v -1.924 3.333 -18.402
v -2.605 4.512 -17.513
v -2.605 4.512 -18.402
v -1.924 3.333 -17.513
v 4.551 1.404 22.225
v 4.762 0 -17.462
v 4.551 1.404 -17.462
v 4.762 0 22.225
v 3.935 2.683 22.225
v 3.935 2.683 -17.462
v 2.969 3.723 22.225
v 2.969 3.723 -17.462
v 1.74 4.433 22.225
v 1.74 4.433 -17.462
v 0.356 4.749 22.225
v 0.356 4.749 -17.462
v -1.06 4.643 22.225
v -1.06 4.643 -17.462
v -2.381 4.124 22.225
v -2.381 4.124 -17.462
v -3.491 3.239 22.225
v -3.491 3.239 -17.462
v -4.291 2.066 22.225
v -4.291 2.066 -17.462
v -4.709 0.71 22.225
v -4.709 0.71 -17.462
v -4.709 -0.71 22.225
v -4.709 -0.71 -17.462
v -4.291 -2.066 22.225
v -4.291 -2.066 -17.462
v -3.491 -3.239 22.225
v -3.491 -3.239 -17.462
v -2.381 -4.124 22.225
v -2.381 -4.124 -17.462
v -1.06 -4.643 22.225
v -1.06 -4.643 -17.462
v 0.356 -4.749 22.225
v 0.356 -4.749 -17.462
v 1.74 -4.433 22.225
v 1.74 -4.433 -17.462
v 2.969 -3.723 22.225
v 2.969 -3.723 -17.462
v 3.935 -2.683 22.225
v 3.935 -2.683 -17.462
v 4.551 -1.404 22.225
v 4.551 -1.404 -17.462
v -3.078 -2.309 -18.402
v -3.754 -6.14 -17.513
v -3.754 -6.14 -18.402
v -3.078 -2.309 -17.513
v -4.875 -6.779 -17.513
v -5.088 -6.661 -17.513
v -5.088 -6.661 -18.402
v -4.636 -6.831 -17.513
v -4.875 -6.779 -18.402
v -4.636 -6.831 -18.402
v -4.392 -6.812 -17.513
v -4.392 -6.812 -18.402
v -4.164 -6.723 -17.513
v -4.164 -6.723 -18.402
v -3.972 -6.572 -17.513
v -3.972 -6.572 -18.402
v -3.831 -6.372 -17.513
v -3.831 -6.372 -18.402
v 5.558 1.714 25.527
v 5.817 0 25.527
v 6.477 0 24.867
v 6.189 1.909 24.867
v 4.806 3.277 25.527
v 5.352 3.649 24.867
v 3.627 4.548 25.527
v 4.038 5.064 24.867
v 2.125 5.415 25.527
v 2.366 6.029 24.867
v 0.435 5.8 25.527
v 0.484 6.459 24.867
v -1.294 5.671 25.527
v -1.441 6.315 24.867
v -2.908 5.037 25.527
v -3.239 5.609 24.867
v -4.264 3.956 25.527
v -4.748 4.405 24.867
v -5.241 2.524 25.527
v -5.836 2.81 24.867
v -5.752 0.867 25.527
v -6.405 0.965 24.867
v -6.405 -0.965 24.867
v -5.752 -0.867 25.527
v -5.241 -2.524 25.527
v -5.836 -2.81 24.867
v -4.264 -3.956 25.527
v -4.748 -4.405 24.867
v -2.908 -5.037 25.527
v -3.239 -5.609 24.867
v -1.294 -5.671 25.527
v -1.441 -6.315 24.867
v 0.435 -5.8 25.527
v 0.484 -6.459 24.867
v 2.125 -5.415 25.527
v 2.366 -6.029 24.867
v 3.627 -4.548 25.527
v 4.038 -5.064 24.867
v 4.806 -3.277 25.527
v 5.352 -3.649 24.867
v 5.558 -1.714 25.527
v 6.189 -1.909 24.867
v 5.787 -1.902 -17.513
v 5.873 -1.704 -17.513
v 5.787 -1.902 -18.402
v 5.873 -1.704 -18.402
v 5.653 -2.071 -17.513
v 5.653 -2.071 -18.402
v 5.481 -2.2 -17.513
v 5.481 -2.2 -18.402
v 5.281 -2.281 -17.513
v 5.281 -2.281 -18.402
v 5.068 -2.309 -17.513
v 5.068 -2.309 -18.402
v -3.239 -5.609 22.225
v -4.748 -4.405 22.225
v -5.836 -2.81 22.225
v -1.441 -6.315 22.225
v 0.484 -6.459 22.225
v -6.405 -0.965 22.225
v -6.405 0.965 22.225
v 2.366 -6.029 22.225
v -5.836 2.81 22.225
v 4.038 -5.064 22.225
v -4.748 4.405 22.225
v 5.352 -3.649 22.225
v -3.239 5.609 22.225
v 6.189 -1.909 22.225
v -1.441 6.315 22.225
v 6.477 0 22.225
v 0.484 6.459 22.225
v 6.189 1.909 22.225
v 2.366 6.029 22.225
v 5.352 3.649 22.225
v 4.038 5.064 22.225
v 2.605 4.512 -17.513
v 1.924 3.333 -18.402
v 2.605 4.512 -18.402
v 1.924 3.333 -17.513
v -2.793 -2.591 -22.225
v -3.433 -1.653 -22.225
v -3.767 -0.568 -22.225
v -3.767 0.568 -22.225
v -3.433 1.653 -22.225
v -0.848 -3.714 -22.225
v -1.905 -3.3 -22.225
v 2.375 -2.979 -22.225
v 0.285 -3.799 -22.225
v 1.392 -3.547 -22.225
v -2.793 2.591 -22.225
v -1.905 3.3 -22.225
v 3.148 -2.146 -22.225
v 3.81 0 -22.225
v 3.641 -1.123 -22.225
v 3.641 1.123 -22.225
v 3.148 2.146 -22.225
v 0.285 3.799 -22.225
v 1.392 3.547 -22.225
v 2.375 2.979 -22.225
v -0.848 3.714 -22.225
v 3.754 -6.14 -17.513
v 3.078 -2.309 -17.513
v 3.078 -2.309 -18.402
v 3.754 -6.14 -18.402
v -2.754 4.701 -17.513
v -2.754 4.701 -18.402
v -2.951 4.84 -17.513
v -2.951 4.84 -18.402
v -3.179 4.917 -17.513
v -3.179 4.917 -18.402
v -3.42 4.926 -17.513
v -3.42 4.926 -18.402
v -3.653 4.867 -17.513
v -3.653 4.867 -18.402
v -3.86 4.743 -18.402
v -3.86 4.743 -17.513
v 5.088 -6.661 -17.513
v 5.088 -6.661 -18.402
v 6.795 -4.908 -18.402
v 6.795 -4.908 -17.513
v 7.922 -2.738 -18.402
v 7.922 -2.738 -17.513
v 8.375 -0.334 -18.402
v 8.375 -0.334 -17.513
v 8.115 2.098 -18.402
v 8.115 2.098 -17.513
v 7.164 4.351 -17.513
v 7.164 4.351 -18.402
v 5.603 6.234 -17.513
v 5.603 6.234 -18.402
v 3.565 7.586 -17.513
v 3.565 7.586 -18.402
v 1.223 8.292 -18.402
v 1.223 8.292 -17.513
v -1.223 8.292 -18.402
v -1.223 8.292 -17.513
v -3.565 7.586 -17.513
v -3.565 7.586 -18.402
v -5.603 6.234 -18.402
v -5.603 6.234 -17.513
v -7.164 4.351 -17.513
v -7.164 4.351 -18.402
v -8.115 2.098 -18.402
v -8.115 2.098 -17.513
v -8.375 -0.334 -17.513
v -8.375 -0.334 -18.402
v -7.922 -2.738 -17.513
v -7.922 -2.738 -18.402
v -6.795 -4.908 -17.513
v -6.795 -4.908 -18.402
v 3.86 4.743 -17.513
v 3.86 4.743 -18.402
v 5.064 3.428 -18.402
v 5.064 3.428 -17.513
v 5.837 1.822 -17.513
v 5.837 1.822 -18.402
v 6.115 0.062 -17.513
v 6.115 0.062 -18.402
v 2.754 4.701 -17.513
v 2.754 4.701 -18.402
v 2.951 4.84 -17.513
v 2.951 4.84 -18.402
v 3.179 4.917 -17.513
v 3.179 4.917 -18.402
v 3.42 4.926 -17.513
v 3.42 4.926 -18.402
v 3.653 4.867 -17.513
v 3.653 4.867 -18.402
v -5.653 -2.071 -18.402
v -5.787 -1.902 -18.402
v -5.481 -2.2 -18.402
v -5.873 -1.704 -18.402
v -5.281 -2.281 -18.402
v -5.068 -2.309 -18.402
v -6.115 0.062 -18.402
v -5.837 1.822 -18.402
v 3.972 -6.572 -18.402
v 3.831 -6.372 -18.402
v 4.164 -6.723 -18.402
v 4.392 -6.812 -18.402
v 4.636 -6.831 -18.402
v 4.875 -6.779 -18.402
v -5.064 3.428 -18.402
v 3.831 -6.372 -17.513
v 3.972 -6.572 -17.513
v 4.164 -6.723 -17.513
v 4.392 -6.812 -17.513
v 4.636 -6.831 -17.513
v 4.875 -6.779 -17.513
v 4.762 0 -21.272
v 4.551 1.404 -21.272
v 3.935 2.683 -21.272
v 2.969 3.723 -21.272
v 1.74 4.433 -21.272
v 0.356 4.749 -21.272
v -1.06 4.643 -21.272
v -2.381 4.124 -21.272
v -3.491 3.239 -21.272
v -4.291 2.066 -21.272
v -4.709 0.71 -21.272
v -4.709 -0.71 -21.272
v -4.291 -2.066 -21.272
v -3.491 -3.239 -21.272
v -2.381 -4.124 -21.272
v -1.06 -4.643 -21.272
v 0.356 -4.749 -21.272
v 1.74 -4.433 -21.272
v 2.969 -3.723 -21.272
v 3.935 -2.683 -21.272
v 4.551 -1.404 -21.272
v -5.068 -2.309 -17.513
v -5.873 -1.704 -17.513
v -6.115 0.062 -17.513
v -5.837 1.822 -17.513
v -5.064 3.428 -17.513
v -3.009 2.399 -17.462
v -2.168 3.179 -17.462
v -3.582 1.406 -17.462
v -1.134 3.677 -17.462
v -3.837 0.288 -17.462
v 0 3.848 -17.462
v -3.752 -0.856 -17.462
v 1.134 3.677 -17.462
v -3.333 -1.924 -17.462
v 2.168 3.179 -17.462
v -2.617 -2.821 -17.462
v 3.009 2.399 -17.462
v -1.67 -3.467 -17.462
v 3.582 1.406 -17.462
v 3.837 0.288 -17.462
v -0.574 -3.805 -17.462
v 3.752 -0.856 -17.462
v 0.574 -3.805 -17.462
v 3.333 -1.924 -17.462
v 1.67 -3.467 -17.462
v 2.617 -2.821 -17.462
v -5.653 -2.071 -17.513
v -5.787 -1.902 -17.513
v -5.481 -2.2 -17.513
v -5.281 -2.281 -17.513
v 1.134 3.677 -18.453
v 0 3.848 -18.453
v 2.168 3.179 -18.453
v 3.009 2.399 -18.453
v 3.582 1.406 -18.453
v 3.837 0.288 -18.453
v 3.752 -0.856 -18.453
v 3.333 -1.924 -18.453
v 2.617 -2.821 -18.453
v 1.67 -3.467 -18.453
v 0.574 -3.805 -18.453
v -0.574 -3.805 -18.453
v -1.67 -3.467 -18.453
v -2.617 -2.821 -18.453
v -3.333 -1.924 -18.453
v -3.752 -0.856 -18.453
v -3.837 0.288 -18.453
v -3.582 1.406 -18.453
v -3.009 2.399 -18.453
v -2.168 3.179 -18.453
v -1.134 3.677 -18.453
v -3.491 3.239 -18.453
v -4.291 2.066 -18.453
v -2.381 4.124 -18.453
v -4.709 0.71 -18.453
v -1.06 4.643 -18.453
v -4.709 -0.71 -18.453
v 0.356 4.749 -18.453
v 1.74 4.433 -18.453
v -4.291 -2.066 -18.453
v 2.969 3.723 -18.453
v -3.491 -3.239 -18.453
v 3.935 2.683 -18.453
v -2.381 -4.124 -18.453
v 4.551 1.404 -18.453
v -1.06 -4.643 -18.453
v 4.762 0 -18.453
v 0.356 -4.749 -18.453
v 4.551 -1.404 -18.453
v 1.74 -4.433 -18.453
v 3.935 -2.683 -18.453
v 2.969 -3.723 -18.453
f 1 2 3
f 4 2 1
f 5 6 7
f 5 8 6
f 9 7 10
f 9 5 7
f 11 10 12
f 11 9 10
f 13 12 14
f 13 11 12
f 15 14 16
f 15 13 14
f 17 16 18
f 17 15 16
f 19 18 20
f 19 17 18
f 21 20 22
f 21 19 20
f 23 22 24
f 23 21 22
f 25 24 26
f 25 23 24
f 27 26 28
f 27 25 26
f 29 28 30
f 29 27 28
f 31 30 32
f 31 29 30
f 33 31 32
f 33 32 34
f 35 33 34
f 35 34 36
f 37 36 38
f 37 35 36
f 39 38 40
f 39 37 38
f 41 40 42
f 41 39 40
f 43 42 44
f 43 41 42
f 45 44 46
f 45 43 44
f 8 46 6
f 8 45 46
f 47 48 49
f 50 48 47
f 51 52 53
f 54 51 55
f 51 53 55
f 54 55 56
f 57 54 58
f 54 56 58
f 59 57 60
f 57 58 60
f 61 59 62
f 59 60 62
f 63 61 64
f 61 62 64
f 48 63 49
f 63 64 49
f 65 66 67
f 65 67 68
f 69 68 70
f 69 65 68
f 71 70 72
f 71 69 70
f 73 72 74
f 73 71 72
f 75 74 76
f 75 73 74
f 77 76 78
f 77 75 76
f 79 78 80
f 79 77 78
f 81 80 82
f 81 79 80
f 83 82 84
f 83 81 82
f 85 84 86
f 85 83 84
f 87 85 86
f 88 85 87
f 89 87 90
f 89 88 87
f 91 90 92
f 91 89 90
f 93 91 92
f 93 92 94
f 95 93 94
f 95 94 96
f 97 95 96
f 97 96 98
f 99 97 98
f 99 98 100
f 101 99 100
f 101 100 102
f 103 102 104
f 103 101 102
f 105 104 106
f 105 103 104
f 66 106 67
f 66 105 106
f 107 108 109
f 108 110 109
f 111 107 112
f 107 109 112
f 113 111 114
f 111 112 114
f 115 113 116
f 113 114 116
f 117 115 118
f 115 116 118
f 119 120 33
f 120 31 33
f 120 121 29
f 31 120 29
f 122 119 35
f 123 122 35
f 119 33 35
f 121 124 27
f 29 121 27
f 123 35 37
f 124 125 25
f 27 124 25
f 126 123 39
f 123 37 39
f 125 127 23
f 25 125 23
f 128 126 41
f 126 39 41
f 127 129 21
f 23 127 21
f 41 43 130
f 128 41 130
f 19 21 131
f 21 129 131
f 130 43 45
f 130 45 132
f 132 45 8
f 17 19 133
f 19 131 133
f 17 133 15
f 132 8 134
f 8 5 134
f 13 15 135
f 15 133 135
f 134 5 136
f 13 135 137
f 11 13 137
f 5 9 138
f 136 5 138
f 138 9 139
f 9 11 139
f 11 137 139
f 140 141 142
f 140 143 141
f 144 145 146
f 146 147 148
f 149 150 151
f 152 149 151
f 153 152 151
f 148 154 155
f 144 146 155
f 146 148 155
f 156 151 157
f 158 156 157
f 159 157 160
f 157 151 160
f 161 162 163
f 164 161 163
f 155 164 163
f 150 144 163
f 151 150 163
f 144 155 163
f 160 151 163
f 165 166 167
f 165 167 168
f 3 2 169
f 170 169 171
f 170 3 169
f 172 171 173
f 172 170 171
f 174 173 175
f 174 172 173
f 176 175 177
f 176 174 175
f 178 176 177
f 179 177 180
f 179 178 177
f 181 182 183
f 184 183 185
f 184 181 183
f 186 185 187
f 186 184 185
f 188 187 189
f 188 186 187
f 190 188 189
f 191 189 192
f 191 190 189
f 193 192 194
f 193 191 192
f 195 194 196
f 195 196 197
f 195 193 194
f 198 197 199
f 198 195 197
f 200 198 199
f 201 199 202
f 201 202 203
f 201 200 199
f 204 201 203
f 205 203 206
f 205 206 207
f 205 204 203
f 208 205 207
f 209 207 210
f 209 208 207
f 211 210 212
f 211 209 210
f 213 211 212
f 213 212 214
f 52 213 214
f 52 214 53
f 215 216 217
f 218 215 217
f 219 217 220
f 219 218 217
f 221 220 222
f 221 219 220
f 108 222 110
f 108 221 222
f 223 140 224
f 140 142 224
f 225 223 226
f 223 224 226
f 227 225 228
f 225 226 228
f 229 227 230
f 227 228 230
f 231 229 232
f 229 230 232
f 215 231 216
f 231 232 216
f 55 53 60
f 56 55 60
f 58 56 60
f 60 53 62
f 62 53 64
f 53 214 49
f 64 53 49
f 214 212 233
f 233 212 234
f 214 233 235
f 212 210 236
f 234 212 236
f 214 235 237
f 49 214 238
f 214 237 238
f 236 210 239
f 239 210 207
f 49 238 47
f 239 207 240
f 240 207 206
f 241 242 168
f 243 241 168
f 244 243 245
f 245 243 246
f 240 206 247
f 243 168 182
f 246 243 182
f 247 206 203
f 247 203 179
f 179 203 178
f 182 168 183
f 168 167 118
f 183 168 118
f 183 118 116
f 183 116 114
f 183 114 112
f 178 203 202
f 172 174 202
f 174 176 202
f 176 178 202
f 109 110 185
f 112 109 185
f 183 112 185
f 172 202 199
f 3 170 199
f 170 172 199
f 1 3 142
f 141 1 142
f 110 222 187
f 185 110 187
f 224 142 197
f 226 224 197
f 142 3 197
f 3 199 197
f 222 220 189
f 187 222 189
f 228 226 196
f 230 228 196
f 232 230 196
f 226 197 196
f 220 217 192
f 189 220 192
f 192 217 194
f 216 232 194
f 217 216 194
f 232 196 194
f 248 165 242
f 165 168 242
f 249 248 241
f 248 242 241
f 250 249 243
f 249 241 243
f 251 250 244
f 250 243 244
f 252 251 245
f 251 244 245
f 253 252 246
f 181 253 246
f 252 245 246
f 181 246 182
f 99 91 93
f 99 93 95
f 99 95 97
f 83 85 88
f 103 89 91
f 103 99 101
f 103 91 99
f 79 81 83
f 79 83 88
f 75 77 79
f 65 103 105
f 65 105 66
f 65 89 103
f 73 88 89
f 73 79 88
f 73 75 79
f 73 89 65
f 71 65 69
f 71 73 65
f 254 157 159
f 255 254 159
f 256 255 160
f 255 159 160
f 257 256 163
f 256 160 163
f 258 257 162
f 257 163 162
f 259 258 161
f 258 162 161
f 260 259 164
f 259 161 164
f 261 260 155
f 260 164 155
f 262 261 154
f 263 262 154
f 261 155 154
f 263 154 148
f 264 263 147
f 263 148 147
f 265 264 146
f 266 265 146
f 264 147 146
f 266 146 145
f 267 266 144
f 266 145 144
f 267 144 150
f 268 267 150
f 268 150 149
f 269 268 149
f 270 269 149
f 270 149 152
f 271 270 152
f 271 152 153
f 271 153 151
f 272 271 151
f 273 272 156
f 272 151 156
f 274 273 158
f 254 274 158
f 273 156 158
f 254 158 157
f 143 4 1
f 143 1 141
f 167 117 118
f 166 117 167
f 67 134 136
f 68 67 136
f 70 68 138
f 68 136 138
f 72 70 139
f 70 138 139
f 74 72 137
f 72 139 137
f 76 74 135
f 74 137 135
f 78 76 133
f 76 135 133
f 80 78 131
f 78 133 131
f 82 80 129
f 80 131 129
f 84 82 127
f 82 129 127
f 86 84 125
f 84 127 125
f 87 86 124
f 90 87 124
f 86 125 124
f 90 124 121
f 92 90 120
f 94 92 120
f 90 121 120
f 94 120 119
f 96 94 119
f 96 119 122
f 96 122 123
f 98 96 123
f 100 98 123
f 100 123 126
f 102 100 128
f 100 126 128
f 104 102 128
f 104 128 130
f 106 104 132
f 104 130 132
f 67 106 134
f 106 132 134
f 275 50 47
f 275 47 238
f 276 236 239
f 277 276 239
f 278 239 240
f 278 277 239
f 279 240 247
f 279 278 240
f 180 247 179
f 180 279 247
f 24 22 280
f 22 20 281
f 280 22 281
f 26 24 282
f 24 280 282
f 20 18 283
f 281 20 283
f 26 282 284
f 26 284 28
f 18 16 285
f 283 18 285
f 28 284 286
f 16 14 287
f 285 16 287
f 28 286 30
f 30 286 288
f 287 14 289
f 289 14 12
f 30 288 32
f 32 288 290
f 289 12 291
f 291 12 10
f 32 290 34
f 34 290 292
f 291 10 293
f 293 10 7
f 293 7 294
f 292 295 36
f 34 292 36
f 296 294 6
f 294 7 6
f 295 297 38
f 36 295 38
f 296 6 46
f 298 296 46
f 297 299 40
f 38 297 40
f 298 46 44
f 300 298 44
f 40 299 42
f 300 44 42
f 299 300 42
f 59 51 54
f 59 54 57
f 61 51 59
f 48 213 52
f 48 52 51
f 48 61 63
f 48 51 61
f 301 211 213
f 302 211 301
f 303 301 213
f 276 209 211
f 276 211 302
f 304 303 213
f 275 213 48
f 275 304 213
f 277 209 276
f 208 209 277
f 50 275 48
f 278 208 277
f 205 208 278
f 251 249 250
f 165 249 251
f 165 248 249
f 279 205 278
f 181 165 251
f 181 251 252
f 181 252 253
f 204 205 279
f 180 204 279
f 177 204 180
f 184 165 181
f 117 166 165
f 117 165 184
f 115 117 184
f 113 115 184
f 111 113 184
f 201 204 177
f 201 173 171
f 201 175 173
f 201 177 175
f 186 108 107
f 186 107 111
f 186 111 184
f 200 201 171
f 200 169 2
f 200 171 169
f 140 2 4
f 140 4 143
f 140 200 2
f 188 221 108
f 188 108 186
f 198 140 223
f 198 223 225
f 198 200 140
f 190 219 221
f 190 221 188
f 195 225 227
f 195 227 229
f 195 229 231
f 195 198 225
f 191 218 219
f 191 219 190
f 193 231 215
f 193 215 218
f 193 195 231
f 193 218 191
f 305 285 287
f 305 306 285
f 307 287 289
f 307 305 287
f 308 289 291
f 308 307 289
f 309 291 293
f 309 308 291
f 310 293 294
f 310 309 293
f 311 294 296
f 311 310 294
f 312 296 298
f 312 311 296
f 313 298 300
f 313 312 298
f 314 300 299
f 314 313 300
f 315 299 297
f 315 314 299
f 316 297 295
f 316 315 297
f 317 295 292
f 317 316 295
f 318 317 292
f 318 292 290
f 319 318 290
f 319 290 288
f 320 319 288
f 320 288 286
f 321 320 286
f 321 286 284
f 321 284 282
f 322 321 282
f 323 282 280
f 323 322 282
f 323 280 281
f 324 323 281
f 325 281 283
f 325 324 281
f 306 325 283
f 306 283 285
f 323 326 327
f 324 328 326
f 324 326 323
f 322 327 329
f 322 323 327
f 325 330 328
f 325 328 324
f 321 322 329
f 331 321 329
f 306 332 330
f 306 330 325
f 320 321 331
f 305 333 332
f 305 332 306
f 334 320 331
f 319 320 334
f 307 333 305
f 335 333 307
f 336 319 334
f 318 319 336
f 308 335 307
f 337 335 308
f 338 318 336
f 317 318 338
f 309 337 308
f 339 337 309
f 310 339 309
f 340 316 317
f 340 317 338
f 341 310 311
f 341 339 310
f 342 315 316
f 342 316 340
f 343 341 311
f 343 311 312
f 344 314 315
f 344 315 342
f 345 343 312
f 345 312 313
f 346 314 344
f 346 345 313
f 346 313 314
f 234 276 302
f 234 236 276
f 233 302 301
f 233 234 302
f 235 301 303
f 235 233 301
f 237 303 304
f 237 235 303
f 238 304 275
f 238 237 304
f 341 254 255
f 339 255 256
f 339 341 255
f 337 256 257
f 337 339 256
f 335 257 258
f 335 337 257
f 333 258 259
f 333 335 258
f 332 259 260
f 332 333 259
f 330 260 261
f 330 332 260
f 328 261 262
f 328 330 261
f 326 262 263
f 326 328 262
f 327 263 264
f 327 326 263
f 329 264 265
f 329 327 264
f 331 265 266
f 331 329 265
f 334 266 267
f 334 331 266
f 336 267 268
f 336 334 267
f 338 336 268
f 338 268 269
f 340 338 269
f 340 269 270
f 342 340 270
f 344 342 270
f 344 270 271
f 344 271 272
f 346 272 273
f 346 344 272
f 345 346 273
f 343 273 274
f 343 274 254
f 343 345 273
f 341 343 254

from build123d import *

# Parameters (mm, degrees)
SKETCH2_R      = 4.7625
EXTRUDE1_DEPTH = 22.225
SKETCH3_W      = 0.9906
SKETCH3_H      = 0.9144
SKETCH8_R      = 6.477
EXTRUDE6_DEPTH = 3.302
CHAMFER2_SIZE  = 0.6604
SKETCH4_R      = 8.382
SKETCH4_R_2    = 3.8481
EXTRUDE2_DEPTH = 0.4445
EXTRUDE4_DEPTH = 23.225
EXTRUDE5_DEPTH = 0.889
FILLET1_R      = 0.8382
CHAMFER1_SIZE  = 0.9525


with BuildPart() as part:
    # Sketch2 → Extrude1 (new body, symmetric)
    with BuildSketch(Plane.XY):
        Circle(SKETCH2_R)
    extrude(amount=EXTRUDE1_DEPTH, both=True)

    # Sketch3 → Cut-Revolve1 (revolve, cut)
    with BuildSketch(Plane(origin=(0, 0, 0), x_dir=(0, 0, -1), z_dir=(1, 0, 0))):
        with Locations((17.9578, 4.3053)):
            Rectangle(SKETCH3_W, SKETCH3_H)
    revolve(axis=Axis((0, 0, 22.225), (0, 0, -1)), mode=Mode.SUBTRACT)

    # Sketch8 → Extrude6 (add)
    with BuildSketch(Plane.XY.offset(22.225)):
        Circle(SKETCH8_R)
    extrude(amount=EXTRUDE6_DEPTH)

    # Chamfer2
    chamfer2_edges = [part.edges().sort_by_distance(p)[0] for p in [
        (-6.477, 0, 25.527),
    ]]
    chamfer(chamfer2_edges, length=CHAMFER2_SIZE)

    # Chamfer1
    chamfer1_edges = [part.edges().sort_by_distance(p)[0] for p in [
        (-4.7625, 0, -22.225),
    ]]
    chamfer(chamfer1_edges, length=CHAMFER1_SIZE)


with BuildPart() as body_2:
    # Sketch4 → Extrude2 (new body, symmetric)
    with BuildSketch(Plane.XY.offset(-17.9578)):
        Circle(SKETCH4_R)
        Circle(SKETCH4_R_2, mode=Mode.SUBTRACT)
    extrude(amount=EXTRUDE2_DEPTH, both=True)

    # Sketch5 → Extrude4 (cut, through all)
    with BuildSketch(Plane.XY):
        with BuildLine():
            Line((-3.057525, 5.295788645), (0, 0))
            Line((0, 0), (3.057525, 5.295788645))
            ThreePointArc((3.057525, 5.295788645), (5.785069674, 1.981616859), (5.662420154, -2.30886))
            Line((5.662420154, -2.30886), (3.07848, -2.30886))
            Line((3.07848, -2.30886), (3.972784338, -7.380711931))
            ThreePointArc((3.972784338, -7.380711931), (0, -8.382), (-3.972784338, -7.380711931))
            Line((-3.972784338, -7.380711931), (-3.07848, -2.30886))
            Line((-3.07848, -2.30886), (-5.662420154, -2.30886))
            ThreePointArc((-5.662420154, -2.30886), (-5.785069674, 1.981616859), (-3.057525, 5.295788645))
        make_face()
    extrude(amount=-EXTRUDE4_DEPTH, mode=Mode.SUBTRACT)

    # Sketch6 → Extrude5 (add)
    with BuildSketch(Plane.XY.offset(-17.5133)):
        with BuildLine():
            Line((-1.92405, 3.332552356), (1.92405, 3.332552356))
            ThreePointArc((1.92405, 3.332552356), (0, 3.8481), (-1.92405, 3.332552356))
        make_face()
    extrude(amount=-EXTRUDE5_DEPTH)

    # Fillet1
    fillet1_edges = [body_2.edges().sort_by_distance(p)[0] for p in [
        (3.057525, 5.295788645, -17.9578),
        (3.972784338, -7.380711931, -17.9578),
        (-5.662420154, -2.30886, -17.9578),
        (5.662420154, -2.30886, -17.9578),
        (-3.972784338, -7.380711931, -17.9578),
        (-3.057525, 5.295788645, -17.9578),
    ]]
    fillet(fillet1_edges, radius=FILLET1_R)


solid = Compound([part.part, body_2.part])
